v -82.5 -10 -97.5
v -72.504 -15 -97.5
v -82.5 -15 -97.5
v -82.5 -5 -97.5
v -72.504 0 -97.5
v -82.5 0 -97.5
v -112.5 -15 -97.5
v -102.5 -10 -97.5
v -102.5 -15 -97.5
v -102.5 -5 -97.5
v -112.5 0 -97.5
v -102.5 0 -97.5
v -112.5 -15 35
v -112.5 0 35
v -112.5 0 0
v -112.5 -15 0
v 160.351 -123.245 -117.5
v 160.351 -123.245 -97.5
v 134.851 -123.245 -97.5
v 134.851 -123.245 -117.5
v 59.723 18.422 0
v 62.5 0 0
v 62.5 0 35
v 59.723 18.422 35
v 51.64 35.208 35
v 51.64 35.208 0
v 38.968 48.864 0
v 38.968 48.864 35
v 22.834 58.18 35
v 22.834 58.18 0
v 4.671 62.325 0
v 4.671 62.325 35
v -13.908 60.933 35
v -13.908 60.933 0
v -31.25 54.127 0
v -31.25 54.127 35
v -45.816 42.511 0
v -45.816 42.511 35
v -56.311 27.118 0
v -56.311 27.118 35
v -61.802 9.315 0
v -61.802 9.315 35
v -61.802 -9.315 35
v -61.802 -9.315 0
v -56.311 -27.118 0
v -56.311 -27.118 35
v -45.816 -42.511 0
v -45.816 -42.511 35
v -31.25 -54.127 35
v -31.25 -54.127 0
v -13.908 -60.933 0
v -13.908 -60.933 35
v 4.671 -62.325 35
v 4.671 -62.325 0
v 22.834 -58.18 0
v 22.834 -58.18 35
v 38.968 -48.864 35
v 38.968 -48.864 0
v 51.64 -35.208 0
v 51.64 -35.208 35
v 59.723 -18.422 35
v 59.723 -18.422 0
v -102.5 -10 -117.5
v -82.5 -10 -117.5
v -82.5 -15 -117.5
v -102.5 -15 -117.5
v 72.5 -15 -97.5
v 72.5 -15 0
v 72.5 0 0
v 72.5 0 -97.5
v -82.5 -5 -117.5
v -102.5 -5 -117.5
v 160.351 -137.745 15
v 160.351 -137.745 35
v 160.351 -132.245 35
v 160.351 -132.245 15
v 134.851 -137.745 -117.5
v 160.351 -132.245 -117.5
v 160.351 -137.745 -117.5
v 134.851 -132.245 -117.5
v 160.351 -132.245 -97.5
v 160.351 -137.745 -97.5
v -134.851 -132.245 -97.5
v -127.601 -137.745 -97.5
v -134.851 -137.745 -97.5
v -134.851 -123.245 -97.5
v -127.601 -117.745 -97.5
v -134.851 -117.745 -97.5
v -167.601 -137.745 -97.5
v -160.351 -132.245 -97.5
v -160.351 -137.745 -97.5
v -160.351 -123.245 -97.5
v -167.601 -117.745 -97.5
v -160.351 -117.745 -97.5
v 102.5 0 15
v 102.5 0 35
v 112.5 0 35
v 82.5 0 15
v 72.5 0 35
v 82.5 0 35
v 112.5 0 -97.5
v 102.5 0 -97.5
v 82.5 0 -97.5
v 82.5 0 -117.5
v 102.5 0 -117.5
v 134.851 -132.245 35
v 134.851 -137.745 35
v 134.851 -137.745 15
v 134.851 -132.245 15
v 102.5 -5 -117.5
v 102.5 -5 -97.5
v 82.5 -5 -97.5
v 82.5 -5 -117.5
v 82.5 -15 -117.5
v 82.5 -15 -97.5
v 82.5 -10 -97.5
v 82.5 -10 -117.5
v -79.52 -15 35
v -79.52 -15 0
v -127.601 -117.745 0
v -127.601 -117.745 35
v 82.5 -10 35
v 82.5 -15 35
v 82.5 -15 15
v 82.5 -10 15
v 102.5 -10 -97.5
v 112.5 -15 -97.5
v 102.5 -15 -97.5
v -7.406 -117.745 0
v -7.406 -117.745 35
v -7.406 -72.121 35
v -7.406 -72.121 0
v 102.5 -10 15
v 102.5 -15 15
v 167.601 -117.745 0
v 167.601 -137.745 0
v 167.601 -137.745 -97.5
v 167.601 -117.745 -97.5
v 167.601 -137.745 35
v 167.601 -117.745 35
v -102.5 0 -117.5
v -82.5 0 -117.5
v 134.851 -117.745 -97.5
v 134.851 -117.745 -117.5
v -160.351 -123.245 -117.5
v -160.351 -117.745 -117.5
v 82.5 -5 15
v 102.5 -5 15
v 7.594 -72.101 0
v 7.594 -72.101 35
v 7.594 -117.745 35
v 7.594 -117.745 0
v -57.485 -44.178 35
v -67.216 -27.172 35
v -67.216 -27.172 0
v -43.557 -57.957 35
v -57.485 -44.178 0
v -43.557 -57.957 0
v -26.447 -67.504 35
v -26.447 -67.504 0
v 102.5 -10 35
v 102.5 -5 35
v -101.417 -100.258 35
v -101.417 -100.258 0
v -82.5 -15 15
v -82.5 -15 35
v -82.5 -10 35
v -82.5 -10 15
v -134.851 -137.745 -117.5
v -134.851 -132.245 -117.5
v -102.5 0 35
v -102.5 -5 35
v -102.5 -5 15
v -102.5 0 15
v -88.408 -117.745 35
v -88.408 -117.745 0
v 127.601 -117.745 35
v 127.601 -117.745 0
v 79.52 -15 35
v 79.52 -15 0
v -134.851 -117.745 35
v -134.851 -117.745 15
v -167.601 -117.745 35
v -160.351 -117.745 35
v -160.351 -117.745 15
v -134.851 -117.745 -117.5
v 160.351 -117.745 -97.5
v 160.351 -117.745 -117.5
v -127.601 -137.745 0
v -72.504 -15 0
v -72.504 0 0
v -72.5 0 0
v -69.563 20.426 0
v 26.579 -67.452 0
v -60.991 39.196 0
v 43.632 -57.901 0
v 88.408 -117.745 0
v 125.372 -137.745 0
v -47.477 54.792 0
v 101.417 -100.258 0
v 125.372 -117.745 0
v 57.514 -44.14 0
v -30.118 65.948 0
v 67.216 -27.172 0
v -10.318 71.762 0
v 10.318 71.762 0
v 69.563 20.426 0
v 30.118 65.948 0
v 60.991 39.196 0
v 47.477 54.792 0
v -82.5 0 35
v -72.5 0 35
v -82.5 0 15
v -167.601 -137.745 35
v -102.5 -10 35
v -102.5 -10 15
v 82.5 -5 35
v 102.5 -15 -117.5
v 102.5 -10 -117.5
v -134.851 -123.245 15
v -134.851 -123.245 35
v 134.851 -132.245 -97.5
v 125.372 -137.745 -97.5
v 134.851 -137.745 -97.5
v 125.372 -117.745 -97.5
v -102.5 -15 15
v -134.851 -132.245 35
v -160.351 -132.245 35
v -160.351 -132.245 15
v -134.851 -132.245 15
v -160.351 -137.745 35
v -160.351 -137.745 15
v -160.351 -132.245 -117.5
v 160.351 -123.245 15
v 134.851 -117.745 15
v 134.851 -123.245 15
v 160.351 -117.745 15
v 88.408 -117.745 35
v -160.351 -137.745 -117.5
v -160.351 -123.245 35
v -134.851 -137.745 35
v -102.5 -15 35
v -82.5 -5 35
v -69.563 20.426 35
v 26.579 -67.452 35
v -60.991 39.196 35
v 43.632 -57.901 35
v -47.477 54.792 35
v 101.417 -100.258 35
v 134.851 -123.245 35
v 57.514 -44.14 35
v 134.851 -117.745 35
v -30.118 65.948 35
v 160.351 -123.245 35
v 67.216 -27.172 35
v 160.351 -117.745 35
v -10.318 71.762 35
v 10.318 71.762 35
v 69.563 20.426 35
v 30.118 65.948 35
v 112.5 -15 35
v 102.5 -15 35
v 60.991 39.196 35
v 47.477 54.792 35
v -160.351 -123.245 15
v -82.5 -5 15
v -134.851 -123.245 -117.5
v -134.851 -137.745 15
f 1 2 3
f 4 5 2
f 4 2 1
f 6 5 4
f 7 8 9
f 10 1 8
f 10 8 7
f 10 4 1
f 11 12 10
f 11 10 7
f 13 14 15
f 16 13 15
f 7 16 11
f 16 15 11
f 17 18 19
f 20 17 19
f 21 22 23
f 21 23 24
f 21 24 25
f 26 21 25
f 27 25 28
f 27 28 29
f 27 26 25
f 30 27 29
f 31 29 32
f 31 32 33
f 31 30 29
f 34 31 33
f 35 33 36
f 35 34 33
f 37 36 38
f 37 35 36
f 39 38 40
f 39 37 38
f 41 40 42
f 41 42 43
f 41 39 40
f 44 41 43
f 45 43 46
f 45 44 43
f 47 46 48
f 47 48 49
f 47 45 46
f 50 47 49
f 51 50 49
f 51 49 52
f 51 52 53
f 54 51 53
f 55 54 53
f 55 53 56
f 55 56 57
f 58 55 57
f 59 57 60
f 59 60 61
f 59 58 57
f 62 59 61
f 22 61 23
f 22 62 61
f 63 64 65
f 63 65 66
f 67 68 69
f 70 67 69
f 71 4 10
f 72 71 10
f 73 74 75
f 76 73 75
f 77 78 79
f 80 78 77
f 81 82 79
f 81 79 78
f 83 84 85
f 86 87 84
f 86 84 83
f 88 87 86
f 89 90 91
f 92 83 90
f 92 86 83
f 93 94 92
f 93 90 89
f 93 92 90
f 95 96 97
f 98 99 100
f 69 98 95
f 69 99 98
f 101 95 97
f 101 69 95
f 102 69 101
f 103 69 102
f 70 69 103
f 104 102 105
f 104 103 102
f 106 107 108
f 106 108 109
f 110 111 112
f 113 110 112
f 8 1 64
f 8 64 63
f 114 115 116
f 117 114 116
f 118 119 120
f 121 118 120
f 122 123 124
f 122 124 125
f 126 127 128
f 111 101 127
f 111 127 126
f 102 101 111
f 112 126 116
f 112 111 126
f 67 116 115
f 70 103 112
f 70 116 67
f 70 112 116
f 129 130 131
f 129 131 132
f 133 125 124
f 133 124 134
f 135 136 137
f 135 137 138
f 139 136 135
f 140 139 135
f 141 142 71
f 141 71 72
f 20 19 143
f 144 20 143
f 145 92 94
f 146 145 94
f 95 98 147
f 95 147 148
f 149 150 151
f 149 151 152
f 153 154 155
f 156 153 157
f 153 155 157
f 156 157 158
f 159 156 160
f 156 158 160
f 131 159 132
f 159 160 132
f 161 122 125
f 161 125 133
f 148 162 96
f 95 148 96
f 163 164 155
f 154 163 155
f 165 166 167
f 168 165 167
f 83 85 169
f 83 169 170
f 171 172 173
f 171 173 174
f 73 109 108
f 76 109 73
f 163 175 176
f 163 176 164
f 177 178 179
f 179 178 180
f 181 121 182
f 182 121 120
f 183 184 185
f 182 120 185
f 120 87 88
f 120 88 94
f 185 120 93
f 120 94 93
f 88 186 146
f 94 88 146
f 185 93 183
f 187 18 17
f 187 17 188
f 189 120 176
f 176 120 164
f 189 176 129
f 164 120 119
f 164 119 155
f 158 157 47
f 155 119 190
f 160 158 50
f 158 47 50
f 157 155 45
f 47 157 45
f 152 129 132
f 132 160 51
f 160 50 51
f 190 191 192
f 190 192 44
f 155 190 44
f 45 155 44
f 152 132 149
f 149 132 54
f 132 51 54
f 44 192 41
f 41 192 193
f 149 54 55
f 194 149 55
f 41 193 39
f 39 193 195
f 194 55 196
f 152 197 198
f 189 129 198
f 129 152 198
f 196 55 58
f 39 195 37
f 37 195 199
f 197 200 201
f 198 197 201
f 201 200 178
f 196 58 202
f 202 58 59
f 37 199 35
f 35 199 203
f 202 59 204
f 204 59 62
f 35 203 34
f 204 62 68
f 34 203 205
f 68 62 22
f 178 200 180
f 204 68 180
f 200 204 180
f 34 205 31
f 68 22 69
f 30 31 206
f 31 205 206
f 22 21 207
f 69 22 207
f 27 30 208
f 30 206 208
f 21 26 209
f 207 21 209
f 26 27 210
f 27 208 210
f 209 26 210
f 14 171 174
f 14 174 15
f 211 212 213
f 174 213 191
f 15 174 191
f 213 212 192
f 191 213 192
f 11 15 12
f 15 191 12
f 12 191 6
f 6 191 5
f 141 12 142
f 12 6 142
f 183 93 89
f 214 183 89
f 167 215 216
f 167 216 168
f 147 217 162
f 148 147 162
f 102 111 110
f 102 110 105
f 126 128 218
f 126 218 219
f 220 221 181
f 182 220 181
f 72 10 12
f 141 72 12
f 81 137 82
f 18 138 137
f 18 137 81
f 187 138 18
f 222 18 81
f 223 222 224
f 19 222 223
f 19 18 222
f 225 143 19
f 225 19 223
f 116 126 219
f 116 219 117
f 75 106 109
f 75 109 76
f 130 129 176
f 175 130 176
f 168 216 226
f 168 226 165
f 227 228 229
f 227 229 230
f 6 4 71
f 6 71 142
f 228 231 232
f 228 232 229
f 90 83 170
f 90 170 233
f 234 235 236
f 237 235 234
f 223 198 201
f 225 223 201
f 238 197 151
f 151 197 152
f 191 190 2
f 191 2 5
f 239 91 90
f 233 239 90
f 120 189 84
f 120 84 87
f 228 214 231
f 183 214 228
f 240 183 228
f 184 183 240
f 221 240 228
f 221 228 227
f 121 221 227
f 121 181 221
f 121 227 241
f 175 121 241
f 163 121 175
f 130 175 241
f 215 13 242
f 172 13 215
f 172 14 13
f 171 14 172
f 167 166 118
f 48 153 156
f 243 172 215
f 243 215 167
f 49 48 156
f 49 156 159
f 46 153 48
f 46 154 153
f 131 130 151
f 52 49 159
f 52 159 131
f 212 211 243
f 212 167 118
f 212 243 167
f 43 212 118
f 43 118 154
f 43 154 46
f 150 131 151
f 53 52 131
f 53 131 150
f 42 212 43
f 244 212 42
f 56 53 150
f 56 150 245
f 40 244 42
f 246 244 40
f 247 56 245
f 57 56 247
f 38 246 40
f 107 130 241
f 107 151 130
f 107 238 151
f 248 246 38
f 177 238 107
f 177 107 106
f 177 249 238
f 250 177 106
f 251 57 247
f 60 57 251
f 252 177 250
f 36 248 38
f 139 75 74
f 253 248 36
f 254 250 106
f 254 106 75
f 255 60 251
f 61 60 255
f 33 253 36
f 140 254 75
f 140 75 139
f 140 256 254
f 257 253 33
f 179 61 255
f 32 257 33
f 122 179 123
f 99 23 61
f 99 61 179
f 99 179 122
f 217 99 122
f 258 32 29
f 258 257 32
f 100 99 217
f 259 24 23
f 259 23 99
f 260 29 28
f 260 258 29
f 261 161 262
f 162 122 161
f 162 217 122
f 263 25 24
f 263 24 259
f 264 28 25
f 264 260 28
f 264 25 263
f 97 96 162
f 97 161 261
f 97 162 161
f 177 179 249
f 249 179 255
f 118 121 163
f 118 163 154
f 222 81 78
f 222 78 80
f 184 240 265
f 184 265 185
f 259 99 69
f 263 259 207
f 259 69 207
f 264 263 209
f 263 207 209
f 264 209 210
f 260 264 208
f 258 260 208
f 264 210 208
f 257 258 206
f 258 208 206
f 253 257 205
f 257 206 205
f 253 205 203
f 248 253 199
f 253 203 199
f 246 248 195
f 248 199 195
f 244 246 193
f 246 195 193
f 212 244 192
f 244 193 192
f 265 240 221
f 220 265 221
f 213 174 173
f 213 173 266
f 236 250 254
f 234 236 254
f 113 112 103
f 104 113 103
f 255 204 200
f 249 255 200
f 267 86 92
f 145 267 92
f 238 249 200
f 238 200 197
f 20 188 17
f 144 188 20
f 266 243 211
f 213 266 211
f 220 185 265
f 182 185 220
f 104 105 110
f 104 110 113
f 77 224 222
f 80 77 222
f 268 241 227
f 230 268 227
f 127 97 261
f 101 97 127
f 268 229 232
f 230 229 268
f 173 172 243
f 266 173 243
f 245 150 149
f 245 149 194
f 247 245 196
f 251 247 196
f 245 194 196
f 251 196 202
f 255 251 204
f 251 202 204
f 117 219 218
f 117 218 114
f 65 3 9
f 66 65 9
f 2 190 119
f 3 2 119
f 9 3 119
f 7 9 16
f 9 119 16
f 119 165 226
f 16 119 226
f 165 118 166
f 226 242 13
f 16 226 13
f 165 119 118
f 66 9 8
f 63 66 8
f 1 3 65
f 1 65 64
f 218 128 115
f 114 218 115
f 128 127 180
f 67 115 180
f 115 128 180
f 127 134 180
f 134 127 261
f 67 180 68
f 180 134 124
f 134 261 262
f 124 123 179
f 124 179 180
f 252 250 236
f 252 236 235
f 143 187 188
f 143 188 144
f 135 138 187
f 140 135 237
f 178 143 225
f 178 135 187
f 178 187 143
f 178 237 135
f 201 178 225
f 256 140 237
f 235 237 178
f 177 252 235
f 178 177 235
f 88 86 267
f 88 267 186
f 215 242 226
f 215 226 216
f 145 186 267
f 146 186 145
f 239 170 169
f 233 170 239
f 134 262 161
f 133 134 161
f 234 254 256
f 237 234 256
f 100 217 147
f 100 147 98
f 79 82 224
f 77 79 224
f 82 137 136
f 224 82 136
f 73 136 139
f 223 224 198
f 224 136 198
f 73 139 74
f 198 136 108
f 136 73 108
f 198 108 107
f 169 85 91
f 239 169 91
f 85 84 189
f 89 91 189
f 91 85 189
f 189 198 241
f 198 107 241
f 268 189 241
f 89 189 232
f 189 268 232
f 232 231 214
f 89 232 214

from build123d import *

# Parameters (mm, degrees)
SKETCH1_R            = 62.5
BOSS_EXTRUDE8_DEPTH  = 35
BOSS_EXTRUDE9_REACH  = 192.245
SKETCH2_W            = 15
SKETCH2_H            = 35
SKETCH10_W           = 35
SKETCH10_H           = 15
BOSS_EXTRUDE12_DEPTH = 40
SKETCH6_W            = 35
SKETCH6_H            = 15
BOSS_EXTRUDE10_DEPTH = 40
SKETCH12_W           = 42.229373335
SKETCH12_H           = 20
SKETCH12_W_2         = 40
SKETCH12_H_2         = 15
SKETCH12_W_3         = 39.995847529
BOSS_EXTRUDE13_DEPTH = 97.5
SKETCH13_W           = 20
SKETCH13_H           = 5
SKETCH13_W_2         = 25.5
SKETCH13_H_2         = 5.5
CUT_EXTRUDE1_DEPTH   = 20
SKETCH14_W           = 20
SKETCH14_H           = 5
SKETCH14_W_2         = 25.5
SKETCH14_H_2         = 5.5
BOSS_EXTRUDE14_DEPTH = 20


with BuildPart() as part:
    # Sketch1 → Boss-Extrude8 (new body)
    with BuildSketch(Plane.XY):
        with BuildLine():
            Line((127.600917431, -117.745016448), (72.5, 0))
            ThreePointArc((72.5, 0), (0, 72.5), (-72.5, 0))
            Line((-72.5, 0), (-127.600917431, -117.745016448))
            Line((-127.600917431, -117.745016448), (-167.600917431, -117.745016448))
            Line((-167.600917431, -117.745016448), (-167.600917431, -137.745016448))
            Line((-167.600917431, -137.745016448), (167.600917431, -137.745016448))
            Line((167.600917431, -137.745016448), (167.600917431, -117.745016448))
            Line((167.600917431, -117.745016448), (127.600917431, -117.745016448))
        make_face()
        with BuildLine():
            ThreePointArc((-67.21559633, -27.171926873), (0, -72.5), (67.21559633, -27.171926873))
            Line((67.21559633, -27.171926873), (101.417450928, -100.25778678))
            Line((101.417450928, -100.25778678), (88.408256881, -117.745016448))
            Line((88.408256881, -117.745016448), (-88.408256881, -117.745016448))
            Line((-88.408256881, -117.745016448), (-101.417450928, -100.25778678))
            Line((-101.417450928, -100.25778678), (-67.21559633, -27.171926873))
        make_face(mode=Mode.SUBTRACT)
        Circle(SKETCH1_R, mode=Mode.SUBTRACT)
    extrude(amount=BOSS_EXTRUDE8_DEPTH)

    # Sketch2 → Boss-Extrude9 (add, up to next)
    with BuildSketch(Plane(origin=(0, -117.745016448, 0), x_dir=(1, 0, 0), z_dir=(0, 1, 0)), mode=Mode.PRIVATE) as boss_extrude9_sk1:
        with Locations((0.093911399, -17.5)):
            Rectangle(SKETCH2_W, SKETCH2_H)
    boss_extrude9_tool1 = extrude(boss_extrude9_sk1.sketch, amount=BOSS_EXTRUDE9_REACH, mode=Mode.PRIVATE) - part.part
    add(boss_extrude9_tool1.solids().sort_by_distance((0.093911, -117.745016, 17.5))[0])

    # Sketch10 → Boss-Extrude12 (add)
    with BuildSketch(Plane(origin=(-72.5, 0, 0), x_dir=(0, 0, -1), z_dir=(1, 0, 0))):
        with Locations((-17.5, -7.5)):
            Rectangle(SKETCH10_W, SKETCH10_H)
    extrude(amount=-BOSS_EXTRUDE12_DEPTH)

    # Sketch6 → Boss-Extrude10 (add)
    with BuildSketch(Plane(origin=(72.5, 0, 0), x_dir=(0, 0, -1), z_dir=(1, 0, 0))):
        with Locations((-17.5, -7.5)):
            Rectangle(SKETCH6_W, SKETCH6_H)
    extrude(amount=BOSS_EXTRUDE10_DEPTH)

    # Sketch12 → Boss-Extrude13 (add)
    with BuildSketch(Plane(origin=(0, 0, 0), x_dir=(-1, 0, 0), z_dir=(0, 0, -1))):
        with Locations((-146.486230764, -127.745016448)):
            Rectangle(SKETCH12_W, SKETCH12_H)
        with Locations((147.600917431, -127.745016448)):
            Rectangle(SKETCH12_W_2, SKETCH12_H)
        with Locations((-92.5, -7.5)):
            Rectangle(SKETCH12_W_2, SKETCH12_H_2)
        with Locations((92.502076235, -7.5)):
            Rectangle(SKETCH12_W_3, SKETCH12_H_2)
    extrude(amount=BOSS_EXTRUDE13_DEPTH)

    # Sketch13 → Cut-Extrude1 (cut)
    with BuildSketch(Plane.XY.offset(35)):
        with Locations((-92.5, -12.5)):
            Rectangle(SKETCH13_W, SKETCH13_H)
        with Locations((-147.600917431, -134.995016448)):
            Rectangle(SKETCH13_W_2, SKETCH13_H_2)
        with Locations((-92.5, -2.5)):
            Rectangle(SKETCH13_W, SKETCH13_H)
        with Locations((92.5, -2.5)):
            Rectangle(SKETCH13_W, SKETCH13_H)
        with Locations((92.5, -12.5)):
            Rectangle(SKETCH13_W, SKETCH13_H)
        with Locations((147.600917431, -120.495016448)):
            Rectangle(SKETCH13_W_2, SKETCH13_H_2)
        with Locations((147.600917431, -134.995016448)):
            Rectangle(SKETCH13_W_2, SKETCH13_H_2)
        with Locations((-147.600917431, -120.495016448)):
            Rectangle(SKETCH13_W_2, SKETCH13_H_2)
    extrude(amount=-CUT_EXTRUDE1_DEPTH, mode=Mode.SUBTRACT)

    # Sketch14 → Boss-Extrude14 (add)
    with BuildSketch(Plane(origin=(0, 0, -97.5), x_dir=(-1, 0, 0), z_dir=(0, 0, -1))):
        with Locations((-92.5, -2.5)):
            Rectangle(SKETCH14_W, SKETCH14_H)
        with Locations((-92.5, -12.5)):
            Rectangle(SKETCH14_W, SKETCH14_H)
        with Locations((92.5, -2.5)):
            Rectangle(SKETCH14_W, SKETCH14_H)
        with Locations((92.5, -12.5)):
            Rectangle(SKETCH14_W, SKETCH14_H)
        with Locations((147.600917431, -120.495016448)):
            Rectangle(SKETCH14_W_2, SKETCH14_H_2)
        with Locations((147.600917431, -134.995016448)):
            Rectangle(SKETCH14_W_2, SKETCH14_H_2)
        with Locations((-147.600917431, -120.495016448)):
            Rectangle(SKETCH14_W_2, SKETCH14_H_2)
        with Locations((-147.600917431, -134.995016448)):
            Rectangle(SKETCH14_W_2, SKETCH14_H_2)
    extrude(amount=BOSS_EXTRUDE14_DEPTH)


solid = part.part
